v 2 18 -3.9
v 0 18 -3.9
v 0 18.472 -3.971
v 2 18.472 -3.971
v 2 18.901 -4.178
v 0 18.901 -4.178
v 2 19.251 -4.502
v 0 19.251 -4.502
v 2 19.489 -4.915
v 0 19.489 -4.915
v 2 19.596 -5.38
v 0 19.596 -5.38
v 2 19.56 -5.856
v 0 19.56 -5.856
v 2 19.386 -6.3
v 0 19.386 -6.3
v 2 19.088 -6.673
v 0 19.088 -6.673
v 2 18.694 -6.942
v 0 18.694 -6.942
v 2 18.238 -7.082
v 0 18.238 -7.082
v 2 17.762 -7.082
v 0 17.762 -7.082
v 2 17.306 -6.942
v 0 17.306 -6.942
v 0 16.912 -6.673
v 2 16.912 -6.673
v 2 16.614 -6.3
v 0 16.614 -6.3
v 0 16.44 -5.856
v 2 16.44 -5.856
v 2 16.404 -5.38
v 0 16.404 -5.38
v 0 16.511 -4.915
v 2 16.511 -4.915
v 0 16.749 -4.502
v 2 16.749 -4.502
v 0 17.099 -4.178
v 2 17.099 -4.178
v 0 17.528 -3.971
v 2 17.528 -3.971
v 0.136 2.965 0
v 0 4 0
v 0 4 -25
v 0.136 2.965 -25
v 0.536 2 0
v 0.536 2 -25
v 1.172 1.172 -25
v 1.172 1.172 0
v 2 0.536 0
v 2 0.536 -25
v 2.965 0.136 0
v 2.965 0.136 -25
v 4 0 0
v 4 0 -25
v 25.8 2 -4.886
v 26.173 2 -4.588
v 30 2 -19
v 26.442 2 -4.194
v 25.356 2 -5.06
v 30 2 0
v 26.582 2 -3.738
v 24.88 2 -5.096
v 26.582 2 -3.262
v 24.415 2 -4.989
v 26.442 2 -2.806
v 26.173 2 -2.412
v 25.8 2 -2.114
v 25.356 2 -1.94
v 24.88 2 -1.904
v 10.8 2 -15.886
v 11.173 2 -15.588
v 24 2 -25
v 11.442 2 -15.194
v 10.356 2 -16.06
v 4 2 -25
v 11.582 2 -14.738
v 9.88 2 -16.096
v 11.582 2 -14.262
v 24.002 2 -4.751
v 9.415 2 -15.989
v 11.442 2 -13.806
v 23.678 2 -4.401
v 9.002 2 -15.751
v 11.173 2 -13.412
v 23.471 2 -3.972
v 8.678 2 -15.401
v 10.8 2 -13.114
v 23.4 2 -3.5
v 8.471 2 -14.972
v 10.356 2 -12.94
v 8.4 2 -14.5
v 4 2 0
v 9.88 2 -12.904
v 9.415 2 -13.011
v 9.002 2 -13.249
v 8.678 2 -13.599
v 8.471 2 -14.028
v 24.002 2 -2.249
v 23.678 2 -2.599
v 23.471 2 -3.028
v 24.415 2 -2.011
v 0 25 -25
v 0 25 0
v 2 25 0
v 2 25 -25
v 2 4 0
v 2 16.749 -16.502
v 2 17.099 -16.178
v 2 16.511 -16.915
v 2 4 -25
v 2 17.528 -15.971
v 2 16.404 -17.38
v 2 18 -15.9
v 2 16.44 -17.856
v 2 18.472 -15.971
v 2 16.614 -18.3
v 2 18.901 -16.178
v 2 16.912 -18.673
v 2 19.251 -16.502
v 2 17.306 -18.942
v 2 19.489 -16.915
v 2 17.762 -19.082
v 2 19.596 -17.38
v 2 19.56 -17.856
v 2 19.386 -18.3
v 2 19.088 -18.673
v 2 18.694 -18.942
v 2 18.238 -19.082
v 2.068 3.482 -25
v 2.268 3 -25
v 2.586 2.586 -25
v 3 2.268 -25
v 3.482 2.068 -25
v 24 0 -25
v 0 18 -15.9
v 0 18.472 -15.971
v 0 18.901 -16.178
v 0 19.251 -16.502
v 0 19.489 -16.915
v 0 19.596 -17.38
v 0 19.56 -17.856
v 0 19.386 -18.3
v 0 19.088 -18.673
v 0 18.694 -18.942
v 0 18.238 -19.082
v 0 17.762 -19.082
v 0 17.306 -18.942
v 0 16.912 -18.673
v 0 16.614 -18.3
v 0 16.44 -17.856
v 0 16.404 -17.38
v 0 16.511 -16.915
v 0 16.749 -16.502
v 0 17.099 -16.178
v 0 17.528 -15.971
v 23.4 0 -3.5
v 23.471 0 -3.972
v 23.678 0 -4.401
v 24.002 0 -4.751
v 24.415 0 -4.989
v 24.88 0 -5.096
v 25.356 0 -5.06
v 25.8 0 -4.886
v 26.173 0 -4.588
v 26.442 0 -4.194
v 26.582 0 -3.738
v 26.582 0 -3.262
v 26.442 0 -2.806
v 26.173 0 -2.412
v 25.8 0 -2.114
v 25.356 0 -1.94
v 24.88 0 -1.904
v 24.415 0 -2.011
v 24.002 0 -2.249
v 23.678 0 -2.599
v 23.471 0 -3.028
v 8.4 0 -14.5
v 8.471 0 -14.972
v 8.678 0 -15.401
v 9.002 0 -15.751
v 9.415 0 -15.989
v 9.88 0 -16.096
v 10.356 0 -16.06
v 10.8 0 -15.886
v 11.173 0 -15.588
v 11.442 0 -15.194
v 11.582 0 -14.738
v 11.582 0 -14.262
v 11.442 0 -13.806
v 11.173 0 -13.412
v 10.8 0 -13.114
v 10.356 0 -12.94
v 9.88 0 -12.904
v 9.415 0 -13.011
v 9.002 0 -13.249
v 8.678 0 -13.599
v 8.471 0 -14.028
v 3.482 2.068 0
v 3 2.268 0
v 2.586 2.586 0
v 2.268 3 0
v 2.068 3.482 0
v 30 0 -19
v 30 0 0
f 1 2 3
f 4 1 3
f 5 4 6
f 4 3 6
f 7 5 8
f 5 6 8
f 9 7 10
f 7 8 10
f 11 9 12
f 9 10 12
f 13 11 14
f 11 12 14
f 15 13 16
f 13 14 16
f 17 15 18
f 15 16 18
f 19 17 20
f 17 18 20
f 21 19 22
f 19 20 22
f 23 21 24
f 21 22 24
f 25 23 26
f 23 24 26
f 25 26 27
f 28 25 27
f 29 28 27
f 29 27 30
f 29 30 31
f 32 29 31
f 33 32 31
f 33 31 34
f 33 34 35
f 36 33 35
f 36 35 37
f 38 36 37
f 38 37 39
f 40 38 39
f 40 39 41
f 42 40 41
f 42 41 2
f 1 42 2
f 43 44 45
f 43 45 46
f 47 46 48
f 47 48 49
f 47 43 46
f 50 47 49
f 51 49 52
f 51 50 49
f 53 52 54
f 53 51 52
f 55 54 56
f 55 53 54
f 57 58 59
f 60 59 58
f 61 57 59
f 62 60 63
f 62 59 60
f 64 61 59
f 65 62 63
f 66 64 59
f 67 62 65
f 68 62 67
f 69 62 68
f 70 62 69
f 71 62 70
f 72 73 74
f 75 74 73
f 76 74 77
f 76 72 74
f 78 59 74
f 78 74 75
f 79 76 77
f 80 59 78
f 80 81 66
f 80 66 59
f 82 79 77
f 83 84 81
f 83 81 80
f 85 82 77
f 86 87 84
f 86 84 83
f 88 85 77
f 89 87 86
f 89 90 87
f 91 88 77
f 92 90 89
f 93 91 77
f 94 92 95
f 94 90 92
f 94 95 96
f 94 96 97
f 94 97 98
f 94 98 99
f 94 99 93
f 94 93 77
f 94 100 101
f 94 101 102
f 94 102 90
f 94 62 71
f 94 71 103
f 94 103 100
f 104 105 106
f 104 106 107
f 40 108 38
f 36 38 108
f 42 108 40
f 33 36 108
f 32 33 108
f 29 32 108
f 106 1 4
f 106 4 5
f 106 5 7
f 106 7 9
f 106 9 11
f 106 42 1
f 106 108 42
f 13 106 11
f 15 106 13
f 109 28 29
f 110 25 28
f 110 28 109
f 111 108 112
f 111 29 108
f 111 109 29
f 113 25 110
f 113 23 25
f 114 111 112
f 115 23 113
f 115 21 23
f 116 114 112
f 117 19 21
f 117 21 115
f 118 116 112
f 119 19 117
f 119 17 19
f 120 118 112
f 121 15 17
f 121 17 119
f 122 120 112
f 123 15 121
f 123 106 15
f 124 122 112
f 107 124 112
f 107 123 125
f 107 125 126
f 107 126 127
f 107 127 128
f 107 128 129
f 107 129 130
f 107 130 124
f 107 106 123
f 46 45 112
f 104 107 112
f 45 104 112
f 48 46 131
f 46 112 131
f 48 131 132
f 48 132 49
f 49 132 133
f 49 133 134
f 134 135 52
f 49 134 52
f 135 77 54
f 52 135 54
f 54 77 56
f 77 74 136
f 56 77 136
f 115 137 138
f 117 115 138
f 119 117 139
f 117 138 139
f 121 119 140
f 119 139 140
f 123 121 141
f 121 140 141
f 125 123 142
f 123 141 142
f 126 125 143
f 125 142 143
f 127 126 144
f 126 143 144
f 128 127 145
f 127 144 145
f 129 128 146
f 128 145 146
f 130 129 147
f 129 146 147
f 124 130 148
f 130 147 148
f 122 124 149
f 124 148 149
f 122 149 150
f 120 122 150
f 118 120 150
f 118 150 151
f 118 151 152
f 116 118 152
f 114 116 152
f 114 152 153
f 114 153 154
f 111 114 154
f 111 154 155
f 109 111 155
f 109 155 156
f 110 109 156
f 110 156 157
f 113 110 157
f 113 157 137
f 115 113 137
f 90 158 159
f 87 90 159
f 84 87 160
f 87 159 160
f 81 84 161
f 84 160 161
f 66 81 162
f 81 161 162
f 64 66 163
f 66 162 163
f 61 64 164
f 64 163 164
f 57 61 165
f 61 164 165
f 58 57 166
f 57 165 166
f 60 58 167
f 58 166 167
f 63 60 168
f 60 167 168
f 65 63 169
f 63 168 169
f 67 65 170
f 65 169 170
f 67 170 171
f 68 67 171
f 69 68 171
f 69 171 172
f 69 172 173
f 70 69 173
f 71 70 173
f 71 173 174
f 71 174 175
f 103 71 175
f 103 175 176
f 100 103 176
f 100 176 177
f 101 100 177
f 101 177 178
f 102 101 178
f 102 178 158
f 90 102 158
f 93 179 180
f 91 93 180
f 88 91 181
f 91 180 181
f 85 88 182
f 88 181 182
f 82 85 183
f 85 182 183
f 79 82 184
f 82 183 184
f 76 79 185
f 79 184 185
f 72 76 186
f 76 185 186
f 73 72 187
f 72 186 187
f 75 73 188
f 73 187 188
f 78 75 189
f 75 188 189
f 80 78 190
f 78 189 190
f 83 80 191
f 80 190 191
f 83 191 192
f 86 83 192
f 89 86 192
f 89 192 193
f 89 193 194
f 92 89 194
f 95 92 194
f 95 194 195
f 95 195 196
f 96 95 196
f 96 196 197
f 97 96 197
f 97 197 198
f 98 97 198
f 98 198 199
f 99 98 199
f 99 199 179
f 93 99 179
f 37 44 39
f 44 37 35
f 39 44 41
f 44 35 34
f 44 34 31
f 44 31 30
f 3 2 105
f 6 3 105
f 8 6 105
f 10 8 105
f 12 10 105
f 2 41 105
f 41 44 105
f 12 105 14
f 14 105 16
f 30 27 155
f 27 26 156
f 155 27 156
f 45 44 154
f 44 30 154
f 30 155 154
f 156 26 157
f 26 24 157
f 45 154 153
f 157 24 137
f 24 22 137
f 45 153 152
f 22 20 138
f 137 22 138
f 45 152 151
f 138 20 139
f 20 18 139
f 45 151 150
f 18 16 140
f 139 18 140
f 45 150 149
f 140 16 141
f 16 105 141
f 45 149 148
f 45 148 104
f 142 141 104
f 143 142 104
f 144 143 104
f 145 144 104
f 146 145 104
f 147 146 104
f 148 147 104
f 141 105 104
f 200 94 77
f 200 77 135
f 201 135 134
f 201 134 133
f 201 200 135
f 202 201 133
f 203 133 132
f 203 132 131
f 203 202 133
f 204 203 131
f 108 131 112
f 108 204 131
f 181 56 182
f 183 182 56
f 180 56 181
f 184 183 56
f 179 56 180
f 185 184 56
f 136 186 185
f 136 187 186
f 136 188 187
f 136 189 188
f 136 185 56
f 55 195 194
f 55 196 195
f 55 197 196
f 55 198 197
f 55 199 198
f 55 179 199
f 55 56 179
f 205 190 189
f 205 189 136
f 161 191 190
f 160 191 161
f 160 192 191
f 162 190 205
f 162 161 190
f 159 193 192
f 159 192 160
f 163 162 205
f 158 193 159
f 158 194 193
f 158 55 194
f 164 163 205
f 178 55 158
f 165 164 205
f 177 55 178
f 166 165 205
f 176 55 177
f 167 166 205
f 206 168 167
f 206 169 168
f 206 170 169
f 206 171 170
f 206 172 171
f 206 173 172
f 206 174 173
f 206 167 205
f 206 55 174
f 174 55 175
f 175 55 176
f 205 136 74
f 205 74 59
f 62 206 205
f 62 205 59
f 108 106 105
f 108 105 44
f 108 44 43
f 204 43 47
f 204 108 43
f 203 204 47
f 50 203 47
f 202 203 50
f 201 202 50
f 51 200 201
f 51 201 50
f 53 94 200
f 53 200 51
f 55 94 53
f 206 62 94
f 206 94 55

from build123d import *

# Parameters (mm, degrees)
SKETCH5_W                    = 25
SKETCH5_H                    = 25
BASE_FLANGE1_DEPTH           = 2
EDGE_FLANGE1_STRIP_W         = 12
EDGE_FLANGE1_STRIP_H         = 2
EDGE_FLANGE1_STRIP_CUT_DEPTH = 25
EDGE_FLANGE1_DEPTH           = 25
BREAK_CORNER1_START          = 34.648232278
BREAK_CORNER1_OUTLINE_W      = 11
BREAK_CORNER1_OUTLINE_H      = 2
BREAK_CORNER1_DEPTH          = 4.242640687
F_3_2_3_2_DIAMETER_HOLE1_D   = 3.2
F_3_2_3_2_DIAMETER_HOLE2_D   = 3.2


# Read off the part's stored shape, not the designer's step: Break-Corner1
# Sheet-metal steps are written as plain solids
with BuildPart() as part:
    # Sketch5 → Base-Flange1 (new body)
    with BuildSketch(Plane(origin=(0, 0, 0), x_dir=(0, 0, -1), z_dir=(1, 0, 0))):
        with Locations((12.5, 12.5)):
            Rectangle(SKETCH5_W, SKETCH5_H)
    extrude(amount=BASE_FLANGE1_DEPTH)

    # Edge-Flange1 strip (across the edge) → Edge-Flange1 strip cut (cut)
    with BuildSketch(Plane(origin=(2, 0, 0), x_dir=(0, 1, 0), z_dir=(0, 0, -1))):
        with Locations((-2, -1)):
            Rectangle(EDGE_FLANGE1_STRIP_W, EDGE_FLANGE1_STRIP_H)
    extrude(amount=EDGE_FLANGE1_STRIP_CUT_DEPTH, mode=Mode.SUBTRACT)

    # Edge-Flange1 section (across the edge) → Edge-Flange1 (add)
    with BuildSketch(Plane(origin=(2, 0, 0), x_dir=(0, 1, 0), z_dir=(0, 0, -1))):
        with BuildLine():
            Line((0, 2), (0, 28))
            Line((0, 28), (2, 28))
            Line((2, 28), (2, 2))
            ThreePointArc((2, 2), (2.585786438, 0.585786438), (4, 0))
            Line((4, 0), (4, -2))
            ThreePointArc((4, -2), (1.171572875, -0.828427125), (0, 2))
        make_face()
    extrude(amount=EDGE_FLANGE1_DEPTH)

    # Break-Corner1 outline → Break-Corner1 (cut)
    with BuildSketch(Plane(origin=(0, 0, 0), x_dir=(0.7071067811865474, 0, 0.7071067811865477), z_dir=(0.7071067811865476, 0, -0.7071067811865476)).offset(BREAK_CORNER1_START)):
        with Locations((3.5, -1)):
            Rectangle(BREAK_CORNER1_OUTLINE_W, BREAK_CORNER1_OUTLINE_H)
    extrude(amount=BREAK_CORNER1_DEPTH, mode=Mode.SUBTRACT)

    # Ø3.2 (3.2) Diameter Hole1 (through all)
    with Locations(Plane(origin=(2, 0, 0), x_dir=(0, 0, -1), z_dir=(1, 0, 0))):
        with Locations((5.5, 18), (17.5, 18)):
            Hole(F_3_2_3_2_DIAMETER_HOLE1_D / 2)

    # Ø3.2 (3.2) Diameter Hole2 (through all)
    with Locations(Plane(origin=(0, 2, 0), x_dir=(1, 0, 0), z_dir=(0, 1, 0))):
        with Locations((10, 14.5), (25, 3.5)):
            Hole(F_3_2_3_2_DIAMETER_HOLE2_D / 2)


solid = part.part
